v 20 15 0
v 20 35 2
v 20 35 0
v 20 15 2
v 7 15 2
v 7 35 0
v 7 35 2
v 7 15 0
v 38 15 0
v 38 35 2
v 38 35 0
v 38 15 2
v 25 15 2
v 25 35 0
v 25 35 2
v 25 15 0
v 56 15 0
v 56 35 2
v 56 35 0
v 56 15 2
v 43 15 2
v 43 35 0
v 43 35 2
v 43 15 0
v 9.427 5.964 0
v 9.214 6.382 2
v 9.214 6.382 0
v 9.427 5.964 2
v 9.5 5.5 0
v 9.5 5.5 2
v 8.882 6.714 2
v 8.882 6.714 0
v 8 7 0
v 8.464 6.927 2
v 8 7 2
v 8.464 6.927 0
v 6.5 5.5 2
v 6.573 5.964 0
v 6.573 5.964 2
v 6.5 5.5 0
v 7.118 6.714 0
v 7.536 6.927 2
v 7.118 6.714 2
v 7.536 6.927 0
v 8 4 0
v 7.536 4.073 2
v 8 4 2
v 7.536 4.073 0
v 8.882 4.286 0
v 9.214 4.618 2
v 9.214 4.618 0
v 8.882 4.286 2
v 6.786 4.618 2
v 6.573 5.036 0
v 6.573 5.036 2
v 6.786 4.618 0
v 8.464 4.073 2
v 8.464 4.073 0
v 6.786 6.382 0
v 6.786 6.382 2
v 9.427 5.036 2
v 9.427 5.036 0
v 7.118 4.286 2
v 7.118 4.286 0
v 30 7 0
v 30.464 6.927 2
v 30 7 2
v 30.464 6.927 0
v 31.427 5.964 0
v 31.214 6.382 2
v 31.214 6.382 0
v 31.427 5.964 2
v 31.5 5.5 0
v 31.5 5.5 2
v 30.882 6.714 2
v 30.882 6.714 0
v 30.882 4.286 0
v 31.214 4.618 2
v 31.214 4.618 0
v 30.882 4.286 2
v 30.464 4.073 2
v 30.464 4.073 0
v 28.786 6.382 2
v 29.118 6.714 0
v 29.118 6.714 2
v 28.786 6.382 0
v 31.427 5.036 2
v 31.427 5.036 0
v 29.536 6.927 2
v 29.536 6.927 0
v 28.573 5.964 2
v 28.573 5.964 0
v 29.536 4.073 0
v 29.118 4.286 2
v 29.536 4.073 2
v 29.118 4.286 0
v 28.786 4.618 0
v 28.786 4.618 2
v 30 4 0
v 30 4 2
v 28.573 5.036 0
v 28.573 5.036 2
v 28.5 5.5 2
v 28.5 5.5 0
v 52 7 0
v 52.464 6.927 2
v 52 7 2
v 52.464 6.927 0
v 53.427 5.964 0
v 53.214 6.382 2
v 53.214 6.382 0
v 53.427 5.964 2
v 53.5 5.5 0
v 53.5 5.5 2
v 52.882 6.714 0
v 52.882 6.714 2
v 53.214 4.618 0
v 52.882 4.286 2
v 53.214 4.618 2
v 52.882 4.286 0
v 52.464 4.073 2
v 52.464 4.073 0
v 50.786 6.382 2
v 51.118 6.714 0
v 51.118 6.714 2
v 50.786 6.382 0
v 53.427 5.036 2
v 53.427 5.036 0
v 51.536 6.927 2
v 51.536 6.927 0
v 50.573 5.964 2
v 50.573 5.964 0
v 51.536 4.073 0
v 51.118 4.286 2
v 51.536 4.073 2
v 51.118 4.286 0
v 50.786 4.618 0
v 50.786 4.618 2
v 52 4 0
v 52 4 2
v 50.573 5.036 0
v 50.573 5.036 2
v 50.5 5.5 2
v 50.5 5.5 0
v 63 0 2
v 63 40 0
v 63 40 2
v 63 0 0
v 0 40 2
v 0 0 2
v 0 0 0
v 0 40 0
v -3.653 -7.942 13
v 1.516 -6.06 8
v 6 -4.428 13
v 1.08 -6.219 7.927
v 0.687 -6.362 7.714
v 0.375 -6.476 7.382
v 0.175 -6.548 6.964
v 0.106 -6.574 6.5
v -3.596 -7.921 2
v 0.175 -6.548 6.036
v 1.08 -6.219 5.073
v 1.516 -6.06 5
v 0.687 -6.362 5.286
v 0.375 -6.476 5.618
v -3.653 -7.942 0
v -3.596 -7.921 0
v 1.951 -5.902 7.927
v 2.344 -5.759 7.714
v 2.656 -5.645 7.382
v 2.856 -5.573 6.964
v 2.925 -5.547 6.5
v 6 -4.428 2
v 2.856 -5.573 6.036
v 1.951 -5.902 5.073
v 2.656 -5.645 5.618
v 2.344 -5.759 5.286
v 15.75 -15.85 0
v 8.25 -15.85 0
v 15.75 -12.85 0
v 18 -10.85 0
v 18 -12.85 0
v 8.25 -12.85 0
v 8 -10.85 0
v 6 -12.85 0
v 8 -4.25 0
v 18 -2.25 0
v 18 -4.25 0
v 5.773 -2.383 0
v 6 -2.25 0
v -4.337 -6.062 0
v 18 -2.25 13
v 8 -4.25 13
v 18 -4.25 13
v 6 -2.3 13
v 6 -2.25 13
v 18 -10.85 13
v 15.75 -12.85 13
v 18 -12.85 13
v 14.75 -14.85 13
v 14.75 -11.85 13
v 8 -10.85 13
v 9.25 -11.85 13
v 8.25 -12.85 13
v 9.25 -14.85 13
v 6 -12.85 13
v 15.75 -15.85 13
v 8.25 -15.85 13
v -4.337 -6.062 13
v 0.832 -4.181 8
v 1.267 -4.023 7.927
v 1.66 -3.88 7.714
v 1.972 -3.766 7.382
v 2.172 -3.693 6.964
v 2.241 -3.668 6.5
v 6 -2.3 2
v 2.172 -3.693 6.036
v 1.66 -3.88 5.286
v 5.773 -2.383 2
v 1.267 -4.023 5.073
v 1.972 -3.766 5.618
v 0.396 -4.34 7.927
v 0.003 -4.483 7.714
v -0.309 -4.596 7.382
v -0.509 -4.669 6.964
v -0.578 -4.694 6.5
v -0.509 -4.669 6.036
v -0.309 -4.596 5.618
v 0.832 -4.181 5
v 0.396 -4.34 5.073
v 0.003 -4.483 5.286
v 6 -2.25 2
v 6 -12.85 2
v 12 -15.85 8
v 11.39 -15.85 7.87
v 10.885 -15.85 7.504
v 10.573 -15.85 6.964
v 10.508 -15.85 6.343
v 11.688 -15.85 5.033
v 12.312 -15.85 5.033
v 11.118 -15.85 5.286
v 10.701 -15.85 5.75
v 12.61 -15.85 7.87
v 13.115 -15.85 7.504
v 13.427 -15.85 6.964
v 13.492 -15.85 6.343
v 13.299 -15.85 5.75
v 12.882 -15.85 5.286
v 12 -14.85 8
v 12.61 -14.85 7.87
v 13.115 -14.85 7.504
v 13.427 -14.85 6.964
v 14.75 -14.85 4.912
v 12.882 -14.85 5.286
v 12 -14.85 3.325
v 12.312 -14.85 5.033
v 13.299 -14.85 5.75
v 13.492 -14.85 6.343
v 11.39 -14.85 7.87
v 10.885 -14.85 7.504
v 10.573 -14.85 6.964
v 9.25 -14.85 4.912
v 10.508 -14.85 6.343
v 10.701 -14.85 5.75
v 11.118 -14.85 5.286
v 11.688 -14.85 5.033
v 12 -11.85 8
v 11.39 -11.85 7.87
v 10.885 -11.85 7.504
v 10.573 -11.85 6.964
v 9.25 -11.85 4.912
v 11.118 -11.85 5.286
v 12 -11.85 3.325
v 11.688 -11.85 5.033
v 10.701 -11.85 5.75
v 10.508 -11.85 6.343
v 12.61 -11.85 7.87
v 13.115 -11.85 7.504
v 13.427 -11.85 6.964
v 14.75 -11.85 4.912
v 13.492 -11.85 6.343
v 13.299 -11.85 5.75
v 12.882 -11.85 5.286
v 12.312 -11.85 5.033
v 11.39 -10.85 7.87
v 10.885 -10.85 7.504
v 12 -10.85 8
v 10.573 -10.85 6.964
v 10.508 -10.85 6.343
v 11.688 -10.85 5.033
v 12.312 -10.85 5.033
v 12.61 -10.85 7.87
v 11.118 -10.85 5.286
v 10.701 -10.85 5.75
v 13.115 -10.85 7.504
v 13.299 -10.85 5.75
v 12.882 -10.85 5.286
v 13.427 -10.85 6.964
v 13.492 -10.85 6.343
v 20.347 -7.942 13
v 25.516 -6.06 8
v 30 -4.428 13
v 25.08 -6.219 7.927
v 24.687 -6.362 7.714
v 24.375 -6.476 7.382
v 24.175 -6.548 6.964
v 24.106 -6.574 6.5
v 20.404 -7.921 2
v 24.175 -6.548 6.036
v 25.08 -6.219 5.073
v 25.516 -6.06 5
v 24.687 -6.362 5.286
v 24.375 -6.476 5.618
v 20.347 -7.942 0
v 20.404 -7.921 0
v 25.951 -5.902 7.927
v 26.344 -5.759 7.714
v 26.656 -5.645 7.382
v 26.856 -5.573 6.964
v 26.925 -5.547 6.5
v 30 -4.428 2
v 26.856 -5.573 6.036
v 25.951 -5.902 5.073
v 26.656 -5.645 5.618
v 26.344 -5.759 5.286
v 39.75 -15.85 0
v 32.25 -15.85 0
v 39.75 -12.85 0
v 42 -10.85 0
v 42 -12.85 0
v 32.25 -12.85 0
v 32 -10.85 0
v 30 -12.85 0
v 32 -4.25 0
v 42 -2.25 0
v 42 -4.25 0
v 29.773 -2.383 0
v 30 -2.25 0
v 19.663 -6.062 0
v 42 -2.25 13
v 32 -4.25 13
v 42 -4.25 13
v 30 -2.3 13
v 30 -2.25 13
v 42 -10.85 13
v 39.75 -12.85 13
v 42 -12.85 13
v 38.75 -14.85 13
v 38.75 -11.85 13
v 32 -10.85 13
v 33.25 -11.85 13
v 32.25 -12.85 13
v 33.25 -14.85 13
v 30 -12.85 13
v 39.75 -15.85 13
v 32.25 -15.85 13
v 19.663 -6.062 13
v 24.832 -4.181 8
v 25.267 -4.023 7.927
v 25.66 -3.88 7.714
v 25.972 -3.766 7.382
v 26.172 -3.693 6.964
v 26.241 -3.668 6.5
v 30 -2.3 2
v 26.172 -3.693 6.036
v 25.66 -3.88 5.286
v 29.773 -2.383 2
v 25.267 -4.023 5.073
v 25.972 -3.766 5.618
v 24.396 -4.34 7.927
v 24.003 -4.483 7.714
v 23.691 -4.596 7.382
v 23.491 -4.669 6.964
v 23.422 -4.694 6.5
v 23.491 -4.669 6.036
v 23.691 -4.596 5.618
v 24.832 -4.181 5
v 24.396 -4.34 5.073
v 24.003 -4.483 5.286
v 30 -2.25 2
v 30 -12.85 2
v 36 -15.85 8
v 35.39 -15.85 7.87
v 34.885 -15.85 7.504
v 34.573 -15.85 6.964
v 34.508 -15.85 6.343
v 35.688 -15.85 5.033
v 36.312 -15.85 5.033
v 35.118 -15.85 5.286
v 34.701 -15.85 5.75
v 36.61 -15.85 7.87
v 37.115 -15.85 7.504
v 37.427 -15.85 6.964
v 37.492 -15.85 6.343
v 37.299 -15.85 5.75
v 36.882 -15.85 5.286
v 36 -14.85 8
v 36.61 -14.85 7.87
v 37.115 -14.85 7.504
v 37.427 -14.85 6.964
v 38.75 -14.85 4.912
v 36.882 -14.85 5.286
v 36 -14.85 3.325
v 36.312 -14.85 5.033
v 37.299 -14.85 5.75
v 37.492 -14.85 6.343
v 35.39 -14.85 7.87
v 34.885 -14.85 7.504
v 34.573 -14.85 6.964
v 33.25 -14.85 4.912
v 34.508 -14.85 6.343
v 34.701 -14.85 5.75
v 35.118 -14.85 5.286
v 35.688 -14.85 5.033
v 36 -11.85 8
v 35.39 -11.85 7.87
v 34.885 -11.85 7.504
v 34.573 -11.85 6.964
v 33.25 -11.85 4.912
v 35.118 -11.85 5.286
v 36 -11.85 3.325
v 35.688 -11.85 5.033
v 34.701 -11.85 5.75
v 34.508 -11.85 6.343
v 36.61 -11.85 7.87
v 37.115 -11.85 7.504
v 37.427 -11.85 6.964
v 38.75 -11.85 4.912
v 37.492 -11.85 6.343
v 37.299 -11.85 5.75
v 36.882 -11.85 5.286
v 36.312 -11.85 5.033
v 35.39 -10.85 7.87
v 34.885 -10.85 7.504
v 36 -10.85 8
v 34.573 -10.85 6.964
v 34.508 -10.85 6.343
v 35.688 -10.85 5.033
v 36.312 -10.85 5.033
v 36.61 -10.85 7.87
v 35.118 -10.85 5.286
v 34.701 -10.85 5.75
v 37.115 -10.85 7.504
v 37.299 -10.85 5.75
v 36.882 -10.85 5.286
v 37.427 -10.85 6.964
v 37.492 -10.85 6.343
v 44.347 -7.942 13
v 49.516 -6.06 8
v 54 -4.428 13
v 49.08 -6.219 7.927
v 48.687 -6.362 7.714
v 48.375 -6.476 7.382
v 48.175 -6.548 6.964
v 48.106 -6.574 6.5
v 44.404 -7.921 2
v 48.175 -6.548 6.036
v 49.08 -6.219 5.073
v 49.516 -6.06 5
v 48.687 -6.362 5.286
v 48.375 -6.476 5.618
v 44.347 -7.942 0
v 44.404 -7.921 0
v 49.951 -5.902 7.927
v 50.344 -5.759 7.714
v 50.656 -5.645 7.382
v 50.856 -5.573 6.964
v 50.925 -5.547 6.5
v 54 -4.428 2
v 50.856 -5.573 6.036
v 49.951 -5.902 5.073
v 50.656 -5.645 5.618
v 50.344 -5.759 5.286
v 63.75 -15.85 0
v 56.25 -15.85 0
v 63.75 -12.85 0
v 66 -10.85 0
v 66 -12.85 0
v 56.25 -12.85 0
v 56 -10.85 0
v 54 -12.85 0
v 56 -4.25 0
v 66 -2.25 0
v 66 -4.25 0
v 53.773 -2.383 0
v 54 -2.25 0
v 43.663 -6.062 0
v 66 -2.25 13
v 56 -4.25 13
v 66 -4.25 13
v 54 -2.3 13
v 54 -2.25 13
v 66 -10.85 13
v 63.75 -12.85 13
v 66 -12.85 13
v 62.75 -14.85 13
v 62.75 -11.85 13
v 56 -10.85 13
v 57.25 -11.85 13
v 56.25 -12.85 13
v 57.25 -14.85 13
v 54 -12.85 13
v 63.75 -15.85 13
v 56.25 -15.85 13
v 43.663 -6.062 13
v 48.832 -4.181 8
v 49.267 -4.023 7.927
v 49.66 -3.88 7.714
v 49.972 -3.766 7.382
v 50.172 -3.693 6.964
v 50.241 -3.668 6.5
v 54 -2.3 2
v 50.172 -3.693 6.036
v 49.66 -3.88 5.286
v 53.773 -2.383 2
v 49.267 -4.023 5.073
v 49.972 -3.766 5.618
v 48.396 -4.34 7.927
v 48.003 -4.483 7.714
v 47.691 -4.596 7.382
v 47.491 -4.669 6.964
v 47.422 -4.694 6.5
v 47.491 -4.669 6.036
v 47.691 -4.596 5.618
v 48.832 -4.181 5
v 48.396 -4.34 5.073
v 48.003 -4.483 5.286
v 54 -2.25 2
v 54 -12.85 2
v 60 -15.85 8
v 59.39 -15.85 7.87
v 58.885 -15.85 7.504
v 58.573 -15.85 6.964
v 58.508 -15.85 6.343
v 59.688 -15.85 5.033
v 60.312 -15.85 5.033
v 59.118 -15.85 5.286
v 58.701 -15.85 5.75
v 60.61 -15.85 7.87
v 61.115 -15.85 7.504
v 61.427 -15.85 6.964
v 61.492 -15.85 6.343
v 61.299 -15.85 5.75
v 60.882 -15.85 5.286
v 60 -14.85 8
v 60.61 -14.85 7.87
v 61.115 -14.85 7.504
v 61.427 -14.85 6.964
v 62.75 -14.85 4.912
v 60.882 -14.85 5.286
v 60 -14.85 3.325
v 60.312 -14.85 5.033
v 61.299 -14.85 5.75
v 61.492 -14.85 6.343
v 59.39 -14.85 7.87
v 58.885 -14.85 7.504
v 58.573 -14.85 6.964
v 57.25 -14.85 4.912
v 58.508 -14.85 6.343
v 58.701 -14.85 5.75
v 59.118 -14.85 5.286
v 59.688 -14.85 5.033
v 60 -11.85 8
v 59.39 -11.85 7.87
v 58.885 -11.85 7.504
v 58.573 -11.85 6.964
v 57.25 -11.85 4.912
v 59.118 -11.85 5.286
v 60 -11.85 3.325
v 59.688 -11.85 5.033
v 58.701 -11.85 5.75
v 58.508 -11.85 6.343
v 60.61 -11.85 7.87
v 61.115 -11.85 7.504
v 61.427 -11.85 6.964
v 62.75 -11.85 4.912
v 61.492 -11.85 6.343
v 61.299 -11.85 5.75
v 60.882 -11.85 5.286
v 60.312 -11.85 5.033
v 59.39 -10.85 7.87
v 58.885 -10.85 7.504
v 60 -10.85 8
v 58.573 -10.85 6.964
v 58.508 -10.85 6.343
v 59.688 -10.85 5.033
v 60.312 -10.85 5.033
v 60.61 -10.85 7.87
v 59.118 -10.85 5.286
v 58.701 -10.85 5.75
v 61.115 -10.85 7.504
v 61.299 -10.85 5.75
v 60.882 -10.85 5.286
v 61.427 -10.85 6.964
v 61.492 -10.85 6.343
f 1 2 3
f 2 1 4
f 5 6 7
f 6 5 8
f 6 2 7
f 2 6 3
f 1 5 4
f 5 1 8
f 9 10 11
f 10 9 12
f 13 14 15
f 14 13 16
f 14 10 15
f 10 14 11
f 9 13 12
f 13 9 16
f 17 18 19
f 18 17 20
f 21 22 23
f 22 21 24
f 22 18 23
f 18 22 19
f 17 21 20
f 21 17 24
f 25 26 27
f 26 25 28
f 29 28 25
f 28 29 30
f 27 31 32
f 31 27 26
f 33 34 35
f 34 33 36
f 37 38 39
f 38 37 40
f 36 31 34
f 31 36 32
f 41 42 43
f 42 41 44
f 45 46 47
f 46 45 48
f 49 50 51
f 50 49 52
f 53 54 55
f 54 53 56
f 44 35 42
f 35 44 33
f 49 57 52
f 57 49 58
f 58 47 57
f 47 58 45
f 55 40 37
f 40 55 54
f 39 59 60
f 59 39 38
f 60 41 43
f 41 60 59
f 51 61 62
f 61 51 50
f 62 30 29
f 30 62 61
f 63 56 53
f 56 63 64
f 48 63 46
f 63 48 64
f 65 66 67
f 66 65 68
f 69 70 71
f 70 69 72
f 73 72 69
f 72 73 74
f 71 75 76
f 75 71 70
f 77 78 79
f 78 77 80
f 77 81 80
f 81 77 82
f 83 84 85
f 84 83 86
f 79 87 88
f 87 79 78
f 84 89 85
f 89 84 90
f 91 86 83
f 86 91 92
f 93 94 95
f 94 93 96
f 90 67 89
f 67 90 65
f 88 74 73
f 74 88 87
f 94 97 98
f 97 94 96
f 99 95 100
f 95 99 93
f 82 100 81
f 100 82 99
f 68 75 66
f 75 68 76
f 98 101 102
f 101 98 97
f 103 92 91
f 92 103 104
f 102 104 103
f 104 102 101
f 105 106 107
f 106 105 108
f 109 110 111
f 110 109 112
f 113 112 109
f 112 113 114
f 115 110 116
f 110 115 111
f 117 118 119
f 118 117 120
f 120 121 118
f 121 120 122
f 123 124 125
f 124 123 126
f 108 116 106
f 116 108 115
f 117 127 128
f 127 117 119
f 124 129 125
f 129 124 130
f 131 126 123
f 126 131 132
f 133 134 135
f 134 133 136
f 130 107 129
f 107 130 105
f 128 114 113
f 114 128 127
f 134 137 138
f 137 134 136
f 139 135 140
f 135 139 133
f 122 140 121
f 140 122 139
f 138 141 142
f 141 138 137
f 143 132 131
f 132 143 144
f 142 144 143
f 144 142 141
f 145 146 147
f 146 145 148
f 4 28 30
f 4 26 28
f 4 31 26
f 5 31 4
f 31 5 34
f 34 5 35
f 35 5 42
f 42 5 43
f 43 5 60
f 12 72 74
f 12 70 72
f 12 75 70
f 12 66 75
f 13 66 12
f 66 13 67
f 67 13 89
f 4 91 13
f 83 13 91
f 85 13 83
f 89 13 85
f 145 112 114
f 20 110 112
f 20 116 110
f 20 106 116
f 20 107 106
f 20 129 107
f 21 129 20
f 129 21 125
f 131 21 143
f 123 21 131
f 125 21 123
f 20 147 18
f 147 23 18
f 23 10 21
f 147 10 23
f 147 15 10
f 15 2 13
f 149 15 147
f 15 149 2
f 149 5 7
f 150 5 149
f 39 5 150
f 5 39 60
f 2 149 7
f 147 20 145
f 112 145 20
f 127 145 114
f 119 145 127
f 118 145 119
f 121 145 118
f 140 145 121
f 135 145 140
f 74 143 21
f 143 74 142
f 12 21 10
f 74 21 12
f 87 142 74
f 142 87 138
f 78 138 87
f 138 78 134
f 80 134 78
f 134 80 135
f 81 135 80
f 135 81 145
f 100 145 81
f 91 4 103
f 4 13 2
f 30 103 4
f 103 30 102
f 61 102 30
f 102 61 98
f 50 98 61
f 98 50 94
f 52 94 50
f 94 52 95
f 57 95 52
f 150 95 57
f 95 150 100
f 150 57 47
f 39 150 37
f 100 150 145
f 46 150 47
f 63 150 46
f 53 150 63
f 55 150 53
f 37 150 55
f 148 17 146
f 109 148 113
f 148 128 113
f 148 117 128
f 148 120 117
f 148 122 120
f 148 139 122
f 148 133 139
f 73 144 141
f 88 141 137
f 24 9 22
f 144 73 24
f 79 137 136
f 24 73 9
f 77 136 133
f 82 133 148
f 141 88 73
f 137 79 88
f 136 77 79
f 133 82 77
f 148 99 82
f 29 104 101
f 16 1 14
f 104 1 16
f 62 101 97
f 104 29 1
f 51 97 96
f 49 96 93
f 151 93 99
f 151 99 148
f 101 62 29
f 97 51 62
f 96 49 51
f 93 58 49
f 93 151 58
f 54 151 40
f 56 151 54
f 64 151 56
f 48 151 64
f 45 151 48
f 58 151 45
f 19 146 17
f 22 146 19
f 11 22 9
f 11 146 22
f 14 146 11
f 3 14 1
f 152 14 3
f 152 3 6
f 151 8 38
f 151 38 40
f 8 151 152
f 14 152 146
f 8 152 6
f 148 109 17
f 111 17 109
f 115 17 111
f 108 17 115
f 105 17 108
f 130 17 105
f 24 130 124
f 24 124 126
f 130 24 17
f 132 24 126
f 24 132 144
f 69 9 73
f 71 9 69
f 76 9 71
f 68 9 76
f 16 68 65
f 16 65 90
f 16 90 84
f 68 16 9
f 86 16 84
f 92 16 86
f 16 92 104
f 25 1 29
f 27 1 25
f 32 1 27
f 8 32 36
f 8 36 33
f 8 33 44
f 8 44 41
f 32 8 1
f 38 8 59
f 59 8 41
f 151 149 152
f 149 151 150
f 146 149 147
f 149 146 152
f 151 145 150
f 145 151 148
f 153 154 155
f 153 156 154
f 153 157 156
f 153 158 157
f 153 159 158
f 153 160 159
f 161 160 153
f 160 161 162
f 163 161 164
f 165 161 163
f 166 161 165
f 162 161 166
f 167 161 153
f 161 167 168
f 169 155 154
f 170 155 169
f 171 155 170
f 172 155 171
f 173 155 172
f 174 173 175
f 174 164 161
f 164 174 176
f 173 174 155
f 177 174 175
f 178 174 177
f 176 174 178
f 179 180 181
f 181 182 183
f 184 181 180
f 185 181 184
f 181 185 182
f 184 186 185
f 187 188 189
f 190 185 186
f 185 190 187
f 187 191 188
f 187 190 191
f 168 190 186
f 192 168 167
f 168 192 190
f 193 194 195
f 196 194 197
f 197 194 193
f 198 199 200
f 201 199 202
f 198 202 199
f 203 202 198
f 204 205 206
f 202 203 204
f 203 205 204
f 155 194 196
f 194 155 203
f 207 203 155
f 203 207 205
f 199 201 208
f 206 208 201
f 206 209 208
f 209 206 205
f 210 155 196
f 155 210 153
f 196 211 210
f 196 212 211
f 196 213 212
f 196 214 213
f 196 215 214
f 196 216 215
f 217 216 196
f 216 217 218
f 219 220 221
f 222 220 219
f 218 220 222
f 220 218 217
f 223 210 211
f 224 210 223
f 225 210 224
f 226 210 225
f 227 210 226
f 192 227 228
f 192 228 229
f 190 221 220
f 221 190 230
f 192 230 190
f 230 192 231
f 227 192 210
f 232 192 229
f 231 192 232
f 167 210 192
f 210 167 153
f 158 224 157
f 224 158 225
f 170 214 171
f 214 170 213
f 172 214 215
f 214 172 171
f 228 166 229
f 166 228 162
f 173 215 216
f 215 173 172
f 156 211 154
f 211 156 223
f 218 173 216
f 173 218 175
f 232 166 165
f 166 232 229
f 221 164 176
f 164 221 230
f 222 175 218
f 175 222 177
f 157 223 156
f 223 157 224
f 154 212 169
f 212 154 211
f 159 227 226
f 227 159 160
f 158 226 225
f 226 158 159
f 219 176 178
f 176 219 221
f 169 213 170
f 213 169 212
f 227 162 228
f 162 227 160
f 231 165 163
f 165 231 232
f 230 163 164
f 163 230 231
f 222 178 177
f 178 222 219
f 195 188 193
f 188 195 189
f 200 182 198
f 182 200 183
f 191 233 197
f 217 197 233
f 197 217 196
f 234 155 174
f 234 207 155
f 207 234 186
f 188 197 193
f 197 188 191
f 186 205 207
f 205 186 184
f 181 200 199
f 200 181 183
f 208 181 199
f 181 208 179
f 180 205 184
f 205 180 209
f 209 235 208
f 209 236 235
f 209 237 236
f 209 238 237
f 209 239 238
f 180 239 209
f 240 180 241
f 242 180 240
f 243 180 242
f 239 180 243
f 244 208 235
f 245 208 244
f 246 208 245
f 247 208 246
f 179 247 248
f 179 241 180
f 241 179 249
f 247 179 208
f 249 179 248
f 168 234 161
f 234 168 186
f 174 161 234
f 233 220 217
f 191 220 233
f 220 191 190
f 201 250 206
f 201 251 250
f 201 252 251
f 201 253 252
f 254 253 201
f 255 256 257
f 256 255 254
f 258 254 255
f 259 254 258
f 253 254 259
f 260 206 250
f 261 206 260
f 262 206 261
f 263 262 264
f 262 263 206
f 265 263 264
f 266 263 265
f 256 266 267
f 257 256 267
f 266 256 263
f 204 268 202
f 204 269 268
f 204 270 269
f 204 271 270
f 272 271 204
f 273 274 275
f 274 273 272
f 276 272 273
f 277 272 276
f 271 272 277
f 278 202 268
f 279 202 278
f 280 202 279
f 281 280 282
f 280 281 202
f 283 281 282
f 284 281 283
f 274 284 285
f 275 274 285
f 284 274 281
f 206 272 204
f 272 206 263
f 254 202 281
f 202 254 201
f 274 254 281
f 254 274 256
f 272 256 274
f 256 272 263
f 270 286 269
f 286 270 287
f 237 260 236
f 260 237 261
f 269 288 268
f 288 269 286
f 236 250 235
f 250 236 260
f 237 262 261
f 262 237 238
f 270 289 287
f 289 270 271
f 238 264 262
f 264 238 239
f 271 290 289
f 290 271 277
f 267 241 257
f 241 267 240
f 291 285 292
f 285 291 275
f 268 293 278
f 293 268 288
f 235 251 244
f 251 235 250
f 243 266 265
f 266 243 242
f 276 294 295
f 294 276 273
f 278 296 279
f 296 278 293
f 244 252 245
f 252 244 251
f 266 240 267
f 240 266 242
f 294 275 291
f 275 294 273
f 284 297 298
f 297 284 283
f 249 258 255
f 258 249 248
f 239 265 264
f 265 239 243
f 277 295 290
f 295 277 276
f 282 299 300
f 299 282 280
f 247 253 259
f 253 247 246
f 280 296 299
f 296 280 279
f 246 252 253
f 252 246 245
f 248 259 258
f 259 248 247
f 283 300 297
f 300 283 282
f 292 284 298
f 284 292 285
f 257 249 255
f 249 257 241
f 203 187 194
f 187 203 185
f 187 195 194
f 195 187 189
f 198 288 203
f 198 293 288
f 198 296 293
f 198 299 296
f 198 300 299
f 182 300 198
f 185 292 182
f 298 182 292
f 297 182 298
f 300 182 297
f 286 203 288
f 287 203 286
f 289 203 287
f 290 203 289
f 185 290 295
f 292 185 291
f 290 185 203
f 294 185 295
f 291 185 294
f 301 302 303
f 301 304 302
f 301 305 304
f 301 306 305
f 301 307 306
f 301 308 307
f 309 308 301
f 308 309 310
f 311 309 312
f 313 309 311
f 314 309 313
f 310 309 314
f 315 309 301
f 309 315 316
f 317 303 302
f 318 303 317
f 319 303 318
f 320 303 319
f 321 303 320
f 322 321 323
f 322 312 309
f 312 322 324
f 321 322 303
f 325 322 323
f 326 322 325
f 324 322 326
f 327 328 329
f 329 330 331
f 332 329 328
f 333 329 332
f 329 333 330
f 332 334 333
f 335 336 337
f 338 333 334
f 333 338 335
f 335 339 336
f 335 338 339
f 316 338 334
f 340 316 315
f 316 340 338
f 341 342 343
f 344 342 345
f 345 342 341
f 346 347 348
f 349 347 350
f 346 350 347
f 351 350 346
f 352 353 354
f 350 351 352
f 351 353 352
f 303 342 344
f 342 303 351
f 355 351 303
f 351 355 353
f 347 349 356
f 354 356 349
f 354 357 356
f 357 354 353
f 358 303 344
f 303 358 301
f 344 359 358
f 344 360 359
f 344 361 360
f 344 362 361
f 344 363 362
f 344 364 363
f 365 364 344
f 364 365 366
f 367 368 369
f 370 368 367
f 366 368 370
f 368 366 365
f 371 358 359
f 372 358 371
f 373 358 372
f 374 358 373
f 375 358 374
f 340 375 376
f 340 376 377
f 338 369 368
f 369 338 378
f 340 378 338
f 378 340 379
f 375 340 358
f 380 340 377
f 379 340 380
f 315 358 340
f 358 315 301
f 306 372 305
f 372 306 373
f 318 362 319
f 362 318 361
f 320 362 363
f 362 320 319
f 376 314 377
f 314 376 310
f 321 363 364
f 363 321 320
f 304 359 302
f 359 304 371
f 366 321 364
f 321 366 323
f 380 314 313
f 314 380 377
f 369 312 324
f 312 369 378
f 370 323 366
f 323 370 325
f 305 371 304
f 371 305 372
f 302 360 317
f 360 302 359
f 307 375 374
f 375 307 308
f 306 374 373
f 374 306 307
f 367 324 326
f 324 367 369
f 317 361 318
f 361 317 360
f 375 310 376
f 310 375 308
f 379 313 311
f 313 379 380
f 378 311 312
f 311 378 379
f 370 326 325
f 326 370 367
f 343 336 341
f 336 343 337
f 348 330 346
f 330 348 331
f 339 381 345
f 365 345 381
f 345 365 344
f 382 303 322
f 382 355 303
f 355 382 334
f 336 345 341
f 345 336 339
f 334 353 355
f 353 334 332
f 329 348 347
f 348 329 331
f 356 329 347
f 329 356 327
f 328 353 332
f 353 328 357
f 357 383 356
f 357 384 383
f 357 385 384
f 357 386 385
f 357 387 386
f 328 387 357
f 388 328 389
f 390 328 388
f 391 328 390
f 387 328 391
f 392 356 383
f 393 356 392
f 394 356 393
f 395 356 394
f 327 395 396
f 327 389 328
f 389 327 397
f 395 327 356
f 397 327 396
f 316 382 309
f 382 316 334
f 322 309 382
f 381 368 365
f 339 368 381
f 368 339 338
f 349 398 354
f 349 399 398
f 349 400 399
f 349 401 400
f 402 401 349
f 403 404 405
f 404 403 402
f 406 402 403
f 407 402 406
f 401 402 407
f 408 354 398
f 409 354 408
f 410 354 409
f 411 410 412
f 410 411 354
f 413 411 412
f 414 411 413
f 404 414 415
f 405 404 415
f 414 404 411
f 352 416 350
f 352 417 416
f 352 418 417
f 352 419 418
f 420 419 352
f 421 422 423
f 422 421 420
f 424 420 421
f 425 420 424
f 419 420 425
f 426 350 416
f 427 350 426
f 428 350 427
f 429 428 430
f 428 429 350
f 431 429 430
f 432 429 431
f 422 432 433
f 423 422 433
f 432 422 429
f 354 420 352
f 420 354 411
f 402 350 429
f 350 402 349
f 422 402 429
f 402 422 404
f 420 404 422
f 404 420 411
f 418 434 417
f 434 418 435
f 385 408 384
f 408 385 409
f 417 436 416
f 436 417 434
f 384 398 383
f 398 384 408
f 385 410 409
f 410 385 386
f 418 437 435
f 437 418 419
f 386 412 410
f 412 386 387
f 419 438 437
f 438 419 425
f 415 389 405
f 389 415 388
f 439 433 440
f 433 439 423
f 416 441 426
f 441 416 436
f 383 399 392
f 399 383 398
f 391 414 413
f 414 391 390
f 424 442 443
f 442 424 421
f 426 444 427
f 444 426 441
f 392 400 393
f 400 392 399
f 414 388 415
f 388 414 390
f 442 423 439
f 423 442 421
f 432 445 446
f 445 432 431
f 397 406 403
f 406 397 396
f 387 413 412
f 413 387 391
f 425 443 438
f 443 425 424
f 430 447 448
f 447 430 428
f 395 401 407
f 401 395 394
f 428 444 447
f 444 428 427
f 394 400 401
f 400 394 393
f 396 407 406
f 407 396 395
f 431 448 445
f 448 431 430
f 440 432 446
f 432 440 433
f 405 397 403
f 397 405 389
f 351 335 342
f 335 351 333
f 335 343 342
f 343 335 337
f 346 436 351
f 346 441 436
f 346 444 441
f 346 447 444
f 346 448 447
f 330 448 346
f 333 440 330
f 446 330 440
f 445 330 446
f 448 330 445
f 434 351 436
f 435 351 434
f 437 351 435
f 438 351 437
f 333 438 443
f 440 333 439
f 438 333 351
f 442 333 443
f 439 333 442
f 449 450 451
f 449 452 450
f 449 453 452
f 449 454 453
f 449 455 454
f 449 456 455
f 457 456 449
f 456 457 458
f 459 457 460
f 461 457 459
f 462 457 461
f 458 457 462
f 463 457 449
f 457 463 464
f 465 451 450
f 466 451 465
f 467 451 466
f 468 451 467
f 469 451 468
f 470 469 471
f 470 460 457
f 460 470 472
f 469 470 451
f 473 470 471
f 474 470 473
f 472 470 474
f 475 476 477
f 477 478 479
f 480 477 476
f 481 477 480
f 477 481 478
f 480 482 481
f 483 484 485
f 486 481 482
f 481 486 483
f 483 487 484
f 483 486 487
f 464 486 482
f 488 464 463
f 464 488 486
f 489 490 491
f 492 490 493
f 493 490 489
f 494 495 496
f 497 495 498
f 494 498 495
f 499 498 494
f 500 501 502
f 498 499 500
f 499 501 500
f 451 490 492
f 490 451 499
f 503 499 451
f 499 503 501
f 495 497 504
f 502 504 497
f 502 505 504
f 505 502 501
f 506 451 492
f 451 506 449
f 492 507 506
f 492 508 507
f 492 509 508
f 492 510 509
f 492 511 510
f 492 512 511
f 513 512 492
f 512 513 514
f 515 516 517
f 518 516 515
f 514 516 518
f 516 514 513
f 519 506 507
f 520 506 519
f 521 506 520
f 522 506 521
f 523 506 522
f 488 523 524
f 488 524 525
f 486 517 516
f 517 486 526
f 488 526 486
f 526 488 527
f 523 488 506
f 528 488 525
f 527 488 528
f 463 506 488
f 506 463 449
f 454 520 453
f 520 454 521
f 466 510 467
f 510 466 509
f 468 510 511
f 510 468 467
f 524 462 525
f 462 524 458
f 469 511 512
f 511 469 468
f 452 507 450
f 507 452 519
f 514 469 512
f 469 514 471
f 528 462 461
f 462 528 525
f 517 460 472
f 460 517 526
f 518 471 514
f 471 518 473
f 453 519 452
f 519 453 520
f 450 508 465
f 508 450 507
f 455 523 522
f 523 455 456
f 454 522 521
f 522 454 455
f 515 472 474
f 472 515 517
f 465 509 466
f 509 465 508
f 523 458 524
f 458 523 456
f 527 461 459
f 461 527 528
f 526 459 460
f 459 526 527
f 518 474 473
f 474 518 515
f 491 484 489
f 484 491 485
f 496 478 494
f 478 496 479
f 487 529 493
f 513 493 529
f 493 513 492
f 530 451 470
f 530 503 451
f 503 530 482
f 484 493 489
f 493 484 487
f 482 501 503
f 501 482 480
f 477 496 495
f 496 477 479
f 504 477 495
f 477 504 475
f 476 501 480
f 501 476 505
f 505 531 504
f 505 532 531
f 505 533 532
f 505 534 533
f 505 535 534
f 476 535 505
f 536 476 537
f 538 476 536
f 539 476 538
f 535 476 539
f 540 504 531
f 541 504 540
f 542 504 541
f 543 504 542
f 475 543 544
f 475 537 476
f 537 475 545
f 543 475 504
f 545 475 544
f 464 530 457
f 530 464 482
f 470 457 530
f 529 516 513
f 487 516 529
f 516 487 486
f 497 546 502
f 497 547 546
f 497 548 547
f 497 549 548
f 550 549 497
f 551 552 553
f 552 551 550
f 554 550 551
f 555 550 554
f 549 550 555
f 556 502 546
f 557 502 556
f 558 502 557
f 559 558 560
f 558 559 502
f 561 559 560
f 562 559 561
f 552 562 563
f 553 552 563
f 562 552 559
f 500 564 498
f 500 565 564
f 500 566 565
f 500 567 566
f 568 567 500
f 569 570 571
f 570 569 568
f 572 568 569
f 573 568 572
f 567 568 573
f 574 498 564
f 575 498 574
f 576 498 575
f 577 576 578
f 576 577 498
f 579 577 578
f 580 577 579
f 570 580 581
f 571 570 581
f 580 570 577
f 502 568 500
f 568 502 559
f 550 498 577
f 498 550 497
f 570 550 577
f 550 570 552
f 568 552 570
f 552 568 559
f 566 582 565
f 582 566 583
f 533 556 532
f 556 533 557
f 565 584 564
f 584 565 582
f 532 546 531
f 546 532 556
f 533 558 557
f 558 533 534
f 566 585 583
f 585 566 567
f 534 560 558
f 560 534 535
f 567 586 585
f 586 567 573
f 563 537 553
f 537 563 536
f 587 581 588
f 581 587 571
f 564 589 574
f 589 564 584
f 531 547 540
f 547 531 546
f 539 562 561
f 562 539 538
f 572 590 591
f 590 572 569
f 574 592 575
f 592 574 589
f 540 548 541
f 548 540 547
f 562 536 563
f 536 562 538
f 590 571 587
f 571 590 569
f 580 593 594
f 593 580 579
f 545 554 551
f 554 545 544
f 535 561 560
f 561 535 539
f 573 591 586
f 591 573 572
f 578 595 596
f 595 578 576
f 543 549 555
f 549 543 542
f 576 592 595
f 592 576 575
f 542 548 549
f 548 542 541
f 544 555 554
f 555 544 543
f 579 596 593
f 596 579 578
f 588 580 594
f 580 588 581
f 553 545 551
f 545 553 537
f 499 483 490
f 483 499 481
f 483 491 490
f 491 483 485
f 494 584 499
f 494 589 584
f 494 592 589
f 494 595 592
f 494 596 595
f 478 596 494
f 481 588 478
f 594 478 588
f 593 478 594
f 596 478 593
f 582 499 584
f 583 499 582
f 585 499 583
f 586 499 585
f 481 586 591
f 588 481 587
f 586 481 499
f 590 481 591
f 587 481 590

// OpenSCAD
/*
 * Rocker Switch Panel, v0.42
 *
 * by Alex Franke (CodeCreations), Feb 2014
 * http://www.theFrankes.com
 * 
 * Licenced under Creative Commons Attribution - Non-Commercial - Share Alike 3.0 
 * 
 * INSTRUCTIONS: Choose some values in the "User-defined values" section, and render. 
 * 
 * v1.00, Mar 7, 2014: Supports angles between 90-180, suggested by MyMakibox 
 * v0.42, Feb 1, 2014: Initial Release.
 */
 
/////////////////////////////////////////////////////////////////////////////
// User-defined values... 
/////////////////////////////////////////////////////////////////////////////
 
/* [General Properties] */

// The thickness of the material (switch panel, clip, etc)
thickness = 2;

// The in-diameter of mounting nut (flat to flat)
nutInDiameter = 5.5; 

// The height of the mounting nut
nutHeight = 2.5; 

// The diameter of the screw holes 
screwHoleDiameter = 3; 

// Curve quality
$fn = 20;


/* [Switch Properties] */

// How many rows of switches? 
rows = 1; 

// How many columns of switches? 
columns = 3; 

// The width of the switch opening
switchWidth = 13;

// The length of the switch opening
switchLength = 20; 


/* [Mounting Clip Properties] */

// The angle of the mounted panel 
angle = 70; 

// The number of mounting clips
mountingClips = 3; 

// The distance between the mounting clips and the edges of the panel 
mountingClipMargin = 3;

// The width of the clip that attaches to the board
clipWidth = 13;

// The thickness of the board you're mounting the clips onto
boardWidth = 6.6; 

// The length that the clips extend over the board
boardClampLength = 10; 

// The length of the extender tab that you mount the panel to
extenderLength = 11; 


/* [Spacing] */

// The amount of space between each column of switches (X direction) 
xSwitchPadding = 5;

// The amount of space between each row of switches (Y direction) 
ySwitchPadding = 6;

// The amount of space between the switches and the left and right edges of the panel
xMargin = 7;  

// The amount of space between the switches and the top and bottom edges of the panel
yMargin = 5;  

// How much space to leave for labels
labelPadding = 10; 

// Should label space go below the switch or above it?
labelBelow = true;


/////////////////////////////////////////////////////////////////////////////
// The code... 
/////////////////////////////////////////////////////////////////////////////

rockerSwitchPanel();

yOffset = ( angle < 90 ) ? 0 : extenderLength * cos(180-angle);

translate([
	(thickness+boardClampLength+extenderLength+1)/2,
	-((thickness*2+boardWidth+nutHeight)/2)-1 - yOffset,
	clipWidth/2
	]) 
for ( i=[0:mountingClips-1] ) {
	translate([(thickness+boardClampLength+extenderLength+1)*i,0,0]) 
	mount();
}


/////////////////////////////////////////////////////////////////////////////
// Modules... 
/////////////////////////////////////////////////////////////////////////////

module rockerSwitchPanel() {

	panelSize = [
		columns*switchWidth + xSwitchPadding*(columns-1) + xMargin*2,
		rows*(switchLength+labelPadding) + ySwitchPadding*(rows-1) + yMargin*2,
		thickness
		];
	clipSeperation = (panelSize[0] - 2*mountingClipMargin - mountingClips*clipWidth)
		/(mountingClips-1);

	union() {

		// mounting clips
*		translate([
			mountingClipMargin+boardClampLength/2,
			(thickness*2+boardWidth)/2,
			-(thickness+boardClampLength)/2
		]) 
		for ( i=[0:mountingClips-1] ) { 
			translate([i*(clipSeperation+clipWidth),0,0]) 
			rotate([0,90,180]) 
			mount(); 
		}

		// panel
		//	rotate([angle,0,0]) 
		difference() {
			cube(panelSize);
			
			translate([xMargin,yMargin+(labelBelow?labelPadding:0),-0.5]) 
			for( i=[0:columns-1], j=[0:rows-1] ) {
				translate([
					i*(switchWidth+xSwitchPadding),
					j*(switchLength+ySwitchPadding+labelPadding),
					0]) 		
				 	cube([switchWidth, switchLength, thickness+1]);
			}

			// mounting holes 
			translate([
				mountingClipMargin+boardClampLength/2,
				extenderLength/2,
				-0.5
				])
			for ( i=[0:mountingClips-1] ) { 
				translate([i*(clipSeperation+clipWidth),0,0]) 
				cylinder( h=thickness+1, r= screwHoleDiameter/2);
			}
		}
	}
}

module mount () {

	boxSize = [thickness+boardClampLength,thickness*2+boardWidth,clipWidth]; 

	difference() {
		union() {
			cube(boxSize, center=true); 
			translate([0,-boardWidth/2-((nutHeight + 0.5)+thickness)/2,0]) 
				cube([nutInDiameter+thickness,(nutHeight + 0.5)+thickness,clipWidth], center=true); 

			translate([-boxSize[0]/2,boxSize[1]/2-0.05,clipWidth/2]) 
			rotate([180,0,-angle]) 
			difference() {
				union() {
					cube([thickness,extenderLength,clipWidth], center=false); 
					if ( angle > 90 ) 
						translate([0,-thickness+0.05,0]) 
						cube([thickness,thickness,clipWidth], center=false); 
				}
				translate([-0.5,extenderLength/2,clipWidth/2]) 
				rotate([0,90,0]) 
				cylinder(h=thickness+1, r=screwHoleDiameter/2);
			}

			translate([0,0,-clipWidth/2]) 
			linear_extrude( height=thickness ) 
				polygon( points=[
					[-boxSize[0]/2,-boxSize[1]/2],
					[-boxSize[0]/2,boxSize[1]/2],
					[-boxSize[0]/2-extenderLength*sin(angle)+thickness*sin(90-angle),
						boxSize[1]/2-extenderLength*cos(angle)-thickness*cos(90-angle)]
					] ); 

		}
		translate([thickness,0,0]) 
			cube([boxSize[0],boardWidth,clipWidth+1], center=true); 

		translate([0,-(boardWidth/2 + (nutHeight + 0.5)/2 + thickness/2),0])
		rotate([90,-90,0]) 
		captiveNut( [nutInDiameter,nutHeight + 0.5], setScrewHoleDiameter=screwHoleDiameter, 
			depth=10, holeLengthTop=5, holeLengthBottom=5 );
	}
}


// This is the captive nut module I use in several of my designs. 
module captiveNut( nutSize, setScrewHoleDiameter=3, 
	depth=10, holeLengthTop=5, holeLengthBottom=5 )
{
	render()
	union() {
		nut( nutSize ); 
	
		if ( depth > 0 ) 
			translate([depth/2,0,0]) 
				cube( [depth, nutSize[0], nutSize[1]], center=true );
	
		translate([0,0,-(nutSize[1]/2)-holeLengthBottom]) 
			cylinder(r=setScrewHoleDiameter/2, h=nutSize[1]+holeLengthTop+holeLengthBottom, $fn=15);
	}
}

// nutSize = [inDiameter,thickness]
// (Yes, it's a little nutty.)
module nut( nutSize ) { 
	side = nutSize[0] * tan( 180/6 );
	if ( nutSize[0] * nutSize[1] != 0 ) {
		for ( i = [0 : 2] ) {
			rotate( i*120, [0, 0, 1]) 
				cube( [side, nutSize[0], nutSize[1]], center=true );
		}
	}
}
